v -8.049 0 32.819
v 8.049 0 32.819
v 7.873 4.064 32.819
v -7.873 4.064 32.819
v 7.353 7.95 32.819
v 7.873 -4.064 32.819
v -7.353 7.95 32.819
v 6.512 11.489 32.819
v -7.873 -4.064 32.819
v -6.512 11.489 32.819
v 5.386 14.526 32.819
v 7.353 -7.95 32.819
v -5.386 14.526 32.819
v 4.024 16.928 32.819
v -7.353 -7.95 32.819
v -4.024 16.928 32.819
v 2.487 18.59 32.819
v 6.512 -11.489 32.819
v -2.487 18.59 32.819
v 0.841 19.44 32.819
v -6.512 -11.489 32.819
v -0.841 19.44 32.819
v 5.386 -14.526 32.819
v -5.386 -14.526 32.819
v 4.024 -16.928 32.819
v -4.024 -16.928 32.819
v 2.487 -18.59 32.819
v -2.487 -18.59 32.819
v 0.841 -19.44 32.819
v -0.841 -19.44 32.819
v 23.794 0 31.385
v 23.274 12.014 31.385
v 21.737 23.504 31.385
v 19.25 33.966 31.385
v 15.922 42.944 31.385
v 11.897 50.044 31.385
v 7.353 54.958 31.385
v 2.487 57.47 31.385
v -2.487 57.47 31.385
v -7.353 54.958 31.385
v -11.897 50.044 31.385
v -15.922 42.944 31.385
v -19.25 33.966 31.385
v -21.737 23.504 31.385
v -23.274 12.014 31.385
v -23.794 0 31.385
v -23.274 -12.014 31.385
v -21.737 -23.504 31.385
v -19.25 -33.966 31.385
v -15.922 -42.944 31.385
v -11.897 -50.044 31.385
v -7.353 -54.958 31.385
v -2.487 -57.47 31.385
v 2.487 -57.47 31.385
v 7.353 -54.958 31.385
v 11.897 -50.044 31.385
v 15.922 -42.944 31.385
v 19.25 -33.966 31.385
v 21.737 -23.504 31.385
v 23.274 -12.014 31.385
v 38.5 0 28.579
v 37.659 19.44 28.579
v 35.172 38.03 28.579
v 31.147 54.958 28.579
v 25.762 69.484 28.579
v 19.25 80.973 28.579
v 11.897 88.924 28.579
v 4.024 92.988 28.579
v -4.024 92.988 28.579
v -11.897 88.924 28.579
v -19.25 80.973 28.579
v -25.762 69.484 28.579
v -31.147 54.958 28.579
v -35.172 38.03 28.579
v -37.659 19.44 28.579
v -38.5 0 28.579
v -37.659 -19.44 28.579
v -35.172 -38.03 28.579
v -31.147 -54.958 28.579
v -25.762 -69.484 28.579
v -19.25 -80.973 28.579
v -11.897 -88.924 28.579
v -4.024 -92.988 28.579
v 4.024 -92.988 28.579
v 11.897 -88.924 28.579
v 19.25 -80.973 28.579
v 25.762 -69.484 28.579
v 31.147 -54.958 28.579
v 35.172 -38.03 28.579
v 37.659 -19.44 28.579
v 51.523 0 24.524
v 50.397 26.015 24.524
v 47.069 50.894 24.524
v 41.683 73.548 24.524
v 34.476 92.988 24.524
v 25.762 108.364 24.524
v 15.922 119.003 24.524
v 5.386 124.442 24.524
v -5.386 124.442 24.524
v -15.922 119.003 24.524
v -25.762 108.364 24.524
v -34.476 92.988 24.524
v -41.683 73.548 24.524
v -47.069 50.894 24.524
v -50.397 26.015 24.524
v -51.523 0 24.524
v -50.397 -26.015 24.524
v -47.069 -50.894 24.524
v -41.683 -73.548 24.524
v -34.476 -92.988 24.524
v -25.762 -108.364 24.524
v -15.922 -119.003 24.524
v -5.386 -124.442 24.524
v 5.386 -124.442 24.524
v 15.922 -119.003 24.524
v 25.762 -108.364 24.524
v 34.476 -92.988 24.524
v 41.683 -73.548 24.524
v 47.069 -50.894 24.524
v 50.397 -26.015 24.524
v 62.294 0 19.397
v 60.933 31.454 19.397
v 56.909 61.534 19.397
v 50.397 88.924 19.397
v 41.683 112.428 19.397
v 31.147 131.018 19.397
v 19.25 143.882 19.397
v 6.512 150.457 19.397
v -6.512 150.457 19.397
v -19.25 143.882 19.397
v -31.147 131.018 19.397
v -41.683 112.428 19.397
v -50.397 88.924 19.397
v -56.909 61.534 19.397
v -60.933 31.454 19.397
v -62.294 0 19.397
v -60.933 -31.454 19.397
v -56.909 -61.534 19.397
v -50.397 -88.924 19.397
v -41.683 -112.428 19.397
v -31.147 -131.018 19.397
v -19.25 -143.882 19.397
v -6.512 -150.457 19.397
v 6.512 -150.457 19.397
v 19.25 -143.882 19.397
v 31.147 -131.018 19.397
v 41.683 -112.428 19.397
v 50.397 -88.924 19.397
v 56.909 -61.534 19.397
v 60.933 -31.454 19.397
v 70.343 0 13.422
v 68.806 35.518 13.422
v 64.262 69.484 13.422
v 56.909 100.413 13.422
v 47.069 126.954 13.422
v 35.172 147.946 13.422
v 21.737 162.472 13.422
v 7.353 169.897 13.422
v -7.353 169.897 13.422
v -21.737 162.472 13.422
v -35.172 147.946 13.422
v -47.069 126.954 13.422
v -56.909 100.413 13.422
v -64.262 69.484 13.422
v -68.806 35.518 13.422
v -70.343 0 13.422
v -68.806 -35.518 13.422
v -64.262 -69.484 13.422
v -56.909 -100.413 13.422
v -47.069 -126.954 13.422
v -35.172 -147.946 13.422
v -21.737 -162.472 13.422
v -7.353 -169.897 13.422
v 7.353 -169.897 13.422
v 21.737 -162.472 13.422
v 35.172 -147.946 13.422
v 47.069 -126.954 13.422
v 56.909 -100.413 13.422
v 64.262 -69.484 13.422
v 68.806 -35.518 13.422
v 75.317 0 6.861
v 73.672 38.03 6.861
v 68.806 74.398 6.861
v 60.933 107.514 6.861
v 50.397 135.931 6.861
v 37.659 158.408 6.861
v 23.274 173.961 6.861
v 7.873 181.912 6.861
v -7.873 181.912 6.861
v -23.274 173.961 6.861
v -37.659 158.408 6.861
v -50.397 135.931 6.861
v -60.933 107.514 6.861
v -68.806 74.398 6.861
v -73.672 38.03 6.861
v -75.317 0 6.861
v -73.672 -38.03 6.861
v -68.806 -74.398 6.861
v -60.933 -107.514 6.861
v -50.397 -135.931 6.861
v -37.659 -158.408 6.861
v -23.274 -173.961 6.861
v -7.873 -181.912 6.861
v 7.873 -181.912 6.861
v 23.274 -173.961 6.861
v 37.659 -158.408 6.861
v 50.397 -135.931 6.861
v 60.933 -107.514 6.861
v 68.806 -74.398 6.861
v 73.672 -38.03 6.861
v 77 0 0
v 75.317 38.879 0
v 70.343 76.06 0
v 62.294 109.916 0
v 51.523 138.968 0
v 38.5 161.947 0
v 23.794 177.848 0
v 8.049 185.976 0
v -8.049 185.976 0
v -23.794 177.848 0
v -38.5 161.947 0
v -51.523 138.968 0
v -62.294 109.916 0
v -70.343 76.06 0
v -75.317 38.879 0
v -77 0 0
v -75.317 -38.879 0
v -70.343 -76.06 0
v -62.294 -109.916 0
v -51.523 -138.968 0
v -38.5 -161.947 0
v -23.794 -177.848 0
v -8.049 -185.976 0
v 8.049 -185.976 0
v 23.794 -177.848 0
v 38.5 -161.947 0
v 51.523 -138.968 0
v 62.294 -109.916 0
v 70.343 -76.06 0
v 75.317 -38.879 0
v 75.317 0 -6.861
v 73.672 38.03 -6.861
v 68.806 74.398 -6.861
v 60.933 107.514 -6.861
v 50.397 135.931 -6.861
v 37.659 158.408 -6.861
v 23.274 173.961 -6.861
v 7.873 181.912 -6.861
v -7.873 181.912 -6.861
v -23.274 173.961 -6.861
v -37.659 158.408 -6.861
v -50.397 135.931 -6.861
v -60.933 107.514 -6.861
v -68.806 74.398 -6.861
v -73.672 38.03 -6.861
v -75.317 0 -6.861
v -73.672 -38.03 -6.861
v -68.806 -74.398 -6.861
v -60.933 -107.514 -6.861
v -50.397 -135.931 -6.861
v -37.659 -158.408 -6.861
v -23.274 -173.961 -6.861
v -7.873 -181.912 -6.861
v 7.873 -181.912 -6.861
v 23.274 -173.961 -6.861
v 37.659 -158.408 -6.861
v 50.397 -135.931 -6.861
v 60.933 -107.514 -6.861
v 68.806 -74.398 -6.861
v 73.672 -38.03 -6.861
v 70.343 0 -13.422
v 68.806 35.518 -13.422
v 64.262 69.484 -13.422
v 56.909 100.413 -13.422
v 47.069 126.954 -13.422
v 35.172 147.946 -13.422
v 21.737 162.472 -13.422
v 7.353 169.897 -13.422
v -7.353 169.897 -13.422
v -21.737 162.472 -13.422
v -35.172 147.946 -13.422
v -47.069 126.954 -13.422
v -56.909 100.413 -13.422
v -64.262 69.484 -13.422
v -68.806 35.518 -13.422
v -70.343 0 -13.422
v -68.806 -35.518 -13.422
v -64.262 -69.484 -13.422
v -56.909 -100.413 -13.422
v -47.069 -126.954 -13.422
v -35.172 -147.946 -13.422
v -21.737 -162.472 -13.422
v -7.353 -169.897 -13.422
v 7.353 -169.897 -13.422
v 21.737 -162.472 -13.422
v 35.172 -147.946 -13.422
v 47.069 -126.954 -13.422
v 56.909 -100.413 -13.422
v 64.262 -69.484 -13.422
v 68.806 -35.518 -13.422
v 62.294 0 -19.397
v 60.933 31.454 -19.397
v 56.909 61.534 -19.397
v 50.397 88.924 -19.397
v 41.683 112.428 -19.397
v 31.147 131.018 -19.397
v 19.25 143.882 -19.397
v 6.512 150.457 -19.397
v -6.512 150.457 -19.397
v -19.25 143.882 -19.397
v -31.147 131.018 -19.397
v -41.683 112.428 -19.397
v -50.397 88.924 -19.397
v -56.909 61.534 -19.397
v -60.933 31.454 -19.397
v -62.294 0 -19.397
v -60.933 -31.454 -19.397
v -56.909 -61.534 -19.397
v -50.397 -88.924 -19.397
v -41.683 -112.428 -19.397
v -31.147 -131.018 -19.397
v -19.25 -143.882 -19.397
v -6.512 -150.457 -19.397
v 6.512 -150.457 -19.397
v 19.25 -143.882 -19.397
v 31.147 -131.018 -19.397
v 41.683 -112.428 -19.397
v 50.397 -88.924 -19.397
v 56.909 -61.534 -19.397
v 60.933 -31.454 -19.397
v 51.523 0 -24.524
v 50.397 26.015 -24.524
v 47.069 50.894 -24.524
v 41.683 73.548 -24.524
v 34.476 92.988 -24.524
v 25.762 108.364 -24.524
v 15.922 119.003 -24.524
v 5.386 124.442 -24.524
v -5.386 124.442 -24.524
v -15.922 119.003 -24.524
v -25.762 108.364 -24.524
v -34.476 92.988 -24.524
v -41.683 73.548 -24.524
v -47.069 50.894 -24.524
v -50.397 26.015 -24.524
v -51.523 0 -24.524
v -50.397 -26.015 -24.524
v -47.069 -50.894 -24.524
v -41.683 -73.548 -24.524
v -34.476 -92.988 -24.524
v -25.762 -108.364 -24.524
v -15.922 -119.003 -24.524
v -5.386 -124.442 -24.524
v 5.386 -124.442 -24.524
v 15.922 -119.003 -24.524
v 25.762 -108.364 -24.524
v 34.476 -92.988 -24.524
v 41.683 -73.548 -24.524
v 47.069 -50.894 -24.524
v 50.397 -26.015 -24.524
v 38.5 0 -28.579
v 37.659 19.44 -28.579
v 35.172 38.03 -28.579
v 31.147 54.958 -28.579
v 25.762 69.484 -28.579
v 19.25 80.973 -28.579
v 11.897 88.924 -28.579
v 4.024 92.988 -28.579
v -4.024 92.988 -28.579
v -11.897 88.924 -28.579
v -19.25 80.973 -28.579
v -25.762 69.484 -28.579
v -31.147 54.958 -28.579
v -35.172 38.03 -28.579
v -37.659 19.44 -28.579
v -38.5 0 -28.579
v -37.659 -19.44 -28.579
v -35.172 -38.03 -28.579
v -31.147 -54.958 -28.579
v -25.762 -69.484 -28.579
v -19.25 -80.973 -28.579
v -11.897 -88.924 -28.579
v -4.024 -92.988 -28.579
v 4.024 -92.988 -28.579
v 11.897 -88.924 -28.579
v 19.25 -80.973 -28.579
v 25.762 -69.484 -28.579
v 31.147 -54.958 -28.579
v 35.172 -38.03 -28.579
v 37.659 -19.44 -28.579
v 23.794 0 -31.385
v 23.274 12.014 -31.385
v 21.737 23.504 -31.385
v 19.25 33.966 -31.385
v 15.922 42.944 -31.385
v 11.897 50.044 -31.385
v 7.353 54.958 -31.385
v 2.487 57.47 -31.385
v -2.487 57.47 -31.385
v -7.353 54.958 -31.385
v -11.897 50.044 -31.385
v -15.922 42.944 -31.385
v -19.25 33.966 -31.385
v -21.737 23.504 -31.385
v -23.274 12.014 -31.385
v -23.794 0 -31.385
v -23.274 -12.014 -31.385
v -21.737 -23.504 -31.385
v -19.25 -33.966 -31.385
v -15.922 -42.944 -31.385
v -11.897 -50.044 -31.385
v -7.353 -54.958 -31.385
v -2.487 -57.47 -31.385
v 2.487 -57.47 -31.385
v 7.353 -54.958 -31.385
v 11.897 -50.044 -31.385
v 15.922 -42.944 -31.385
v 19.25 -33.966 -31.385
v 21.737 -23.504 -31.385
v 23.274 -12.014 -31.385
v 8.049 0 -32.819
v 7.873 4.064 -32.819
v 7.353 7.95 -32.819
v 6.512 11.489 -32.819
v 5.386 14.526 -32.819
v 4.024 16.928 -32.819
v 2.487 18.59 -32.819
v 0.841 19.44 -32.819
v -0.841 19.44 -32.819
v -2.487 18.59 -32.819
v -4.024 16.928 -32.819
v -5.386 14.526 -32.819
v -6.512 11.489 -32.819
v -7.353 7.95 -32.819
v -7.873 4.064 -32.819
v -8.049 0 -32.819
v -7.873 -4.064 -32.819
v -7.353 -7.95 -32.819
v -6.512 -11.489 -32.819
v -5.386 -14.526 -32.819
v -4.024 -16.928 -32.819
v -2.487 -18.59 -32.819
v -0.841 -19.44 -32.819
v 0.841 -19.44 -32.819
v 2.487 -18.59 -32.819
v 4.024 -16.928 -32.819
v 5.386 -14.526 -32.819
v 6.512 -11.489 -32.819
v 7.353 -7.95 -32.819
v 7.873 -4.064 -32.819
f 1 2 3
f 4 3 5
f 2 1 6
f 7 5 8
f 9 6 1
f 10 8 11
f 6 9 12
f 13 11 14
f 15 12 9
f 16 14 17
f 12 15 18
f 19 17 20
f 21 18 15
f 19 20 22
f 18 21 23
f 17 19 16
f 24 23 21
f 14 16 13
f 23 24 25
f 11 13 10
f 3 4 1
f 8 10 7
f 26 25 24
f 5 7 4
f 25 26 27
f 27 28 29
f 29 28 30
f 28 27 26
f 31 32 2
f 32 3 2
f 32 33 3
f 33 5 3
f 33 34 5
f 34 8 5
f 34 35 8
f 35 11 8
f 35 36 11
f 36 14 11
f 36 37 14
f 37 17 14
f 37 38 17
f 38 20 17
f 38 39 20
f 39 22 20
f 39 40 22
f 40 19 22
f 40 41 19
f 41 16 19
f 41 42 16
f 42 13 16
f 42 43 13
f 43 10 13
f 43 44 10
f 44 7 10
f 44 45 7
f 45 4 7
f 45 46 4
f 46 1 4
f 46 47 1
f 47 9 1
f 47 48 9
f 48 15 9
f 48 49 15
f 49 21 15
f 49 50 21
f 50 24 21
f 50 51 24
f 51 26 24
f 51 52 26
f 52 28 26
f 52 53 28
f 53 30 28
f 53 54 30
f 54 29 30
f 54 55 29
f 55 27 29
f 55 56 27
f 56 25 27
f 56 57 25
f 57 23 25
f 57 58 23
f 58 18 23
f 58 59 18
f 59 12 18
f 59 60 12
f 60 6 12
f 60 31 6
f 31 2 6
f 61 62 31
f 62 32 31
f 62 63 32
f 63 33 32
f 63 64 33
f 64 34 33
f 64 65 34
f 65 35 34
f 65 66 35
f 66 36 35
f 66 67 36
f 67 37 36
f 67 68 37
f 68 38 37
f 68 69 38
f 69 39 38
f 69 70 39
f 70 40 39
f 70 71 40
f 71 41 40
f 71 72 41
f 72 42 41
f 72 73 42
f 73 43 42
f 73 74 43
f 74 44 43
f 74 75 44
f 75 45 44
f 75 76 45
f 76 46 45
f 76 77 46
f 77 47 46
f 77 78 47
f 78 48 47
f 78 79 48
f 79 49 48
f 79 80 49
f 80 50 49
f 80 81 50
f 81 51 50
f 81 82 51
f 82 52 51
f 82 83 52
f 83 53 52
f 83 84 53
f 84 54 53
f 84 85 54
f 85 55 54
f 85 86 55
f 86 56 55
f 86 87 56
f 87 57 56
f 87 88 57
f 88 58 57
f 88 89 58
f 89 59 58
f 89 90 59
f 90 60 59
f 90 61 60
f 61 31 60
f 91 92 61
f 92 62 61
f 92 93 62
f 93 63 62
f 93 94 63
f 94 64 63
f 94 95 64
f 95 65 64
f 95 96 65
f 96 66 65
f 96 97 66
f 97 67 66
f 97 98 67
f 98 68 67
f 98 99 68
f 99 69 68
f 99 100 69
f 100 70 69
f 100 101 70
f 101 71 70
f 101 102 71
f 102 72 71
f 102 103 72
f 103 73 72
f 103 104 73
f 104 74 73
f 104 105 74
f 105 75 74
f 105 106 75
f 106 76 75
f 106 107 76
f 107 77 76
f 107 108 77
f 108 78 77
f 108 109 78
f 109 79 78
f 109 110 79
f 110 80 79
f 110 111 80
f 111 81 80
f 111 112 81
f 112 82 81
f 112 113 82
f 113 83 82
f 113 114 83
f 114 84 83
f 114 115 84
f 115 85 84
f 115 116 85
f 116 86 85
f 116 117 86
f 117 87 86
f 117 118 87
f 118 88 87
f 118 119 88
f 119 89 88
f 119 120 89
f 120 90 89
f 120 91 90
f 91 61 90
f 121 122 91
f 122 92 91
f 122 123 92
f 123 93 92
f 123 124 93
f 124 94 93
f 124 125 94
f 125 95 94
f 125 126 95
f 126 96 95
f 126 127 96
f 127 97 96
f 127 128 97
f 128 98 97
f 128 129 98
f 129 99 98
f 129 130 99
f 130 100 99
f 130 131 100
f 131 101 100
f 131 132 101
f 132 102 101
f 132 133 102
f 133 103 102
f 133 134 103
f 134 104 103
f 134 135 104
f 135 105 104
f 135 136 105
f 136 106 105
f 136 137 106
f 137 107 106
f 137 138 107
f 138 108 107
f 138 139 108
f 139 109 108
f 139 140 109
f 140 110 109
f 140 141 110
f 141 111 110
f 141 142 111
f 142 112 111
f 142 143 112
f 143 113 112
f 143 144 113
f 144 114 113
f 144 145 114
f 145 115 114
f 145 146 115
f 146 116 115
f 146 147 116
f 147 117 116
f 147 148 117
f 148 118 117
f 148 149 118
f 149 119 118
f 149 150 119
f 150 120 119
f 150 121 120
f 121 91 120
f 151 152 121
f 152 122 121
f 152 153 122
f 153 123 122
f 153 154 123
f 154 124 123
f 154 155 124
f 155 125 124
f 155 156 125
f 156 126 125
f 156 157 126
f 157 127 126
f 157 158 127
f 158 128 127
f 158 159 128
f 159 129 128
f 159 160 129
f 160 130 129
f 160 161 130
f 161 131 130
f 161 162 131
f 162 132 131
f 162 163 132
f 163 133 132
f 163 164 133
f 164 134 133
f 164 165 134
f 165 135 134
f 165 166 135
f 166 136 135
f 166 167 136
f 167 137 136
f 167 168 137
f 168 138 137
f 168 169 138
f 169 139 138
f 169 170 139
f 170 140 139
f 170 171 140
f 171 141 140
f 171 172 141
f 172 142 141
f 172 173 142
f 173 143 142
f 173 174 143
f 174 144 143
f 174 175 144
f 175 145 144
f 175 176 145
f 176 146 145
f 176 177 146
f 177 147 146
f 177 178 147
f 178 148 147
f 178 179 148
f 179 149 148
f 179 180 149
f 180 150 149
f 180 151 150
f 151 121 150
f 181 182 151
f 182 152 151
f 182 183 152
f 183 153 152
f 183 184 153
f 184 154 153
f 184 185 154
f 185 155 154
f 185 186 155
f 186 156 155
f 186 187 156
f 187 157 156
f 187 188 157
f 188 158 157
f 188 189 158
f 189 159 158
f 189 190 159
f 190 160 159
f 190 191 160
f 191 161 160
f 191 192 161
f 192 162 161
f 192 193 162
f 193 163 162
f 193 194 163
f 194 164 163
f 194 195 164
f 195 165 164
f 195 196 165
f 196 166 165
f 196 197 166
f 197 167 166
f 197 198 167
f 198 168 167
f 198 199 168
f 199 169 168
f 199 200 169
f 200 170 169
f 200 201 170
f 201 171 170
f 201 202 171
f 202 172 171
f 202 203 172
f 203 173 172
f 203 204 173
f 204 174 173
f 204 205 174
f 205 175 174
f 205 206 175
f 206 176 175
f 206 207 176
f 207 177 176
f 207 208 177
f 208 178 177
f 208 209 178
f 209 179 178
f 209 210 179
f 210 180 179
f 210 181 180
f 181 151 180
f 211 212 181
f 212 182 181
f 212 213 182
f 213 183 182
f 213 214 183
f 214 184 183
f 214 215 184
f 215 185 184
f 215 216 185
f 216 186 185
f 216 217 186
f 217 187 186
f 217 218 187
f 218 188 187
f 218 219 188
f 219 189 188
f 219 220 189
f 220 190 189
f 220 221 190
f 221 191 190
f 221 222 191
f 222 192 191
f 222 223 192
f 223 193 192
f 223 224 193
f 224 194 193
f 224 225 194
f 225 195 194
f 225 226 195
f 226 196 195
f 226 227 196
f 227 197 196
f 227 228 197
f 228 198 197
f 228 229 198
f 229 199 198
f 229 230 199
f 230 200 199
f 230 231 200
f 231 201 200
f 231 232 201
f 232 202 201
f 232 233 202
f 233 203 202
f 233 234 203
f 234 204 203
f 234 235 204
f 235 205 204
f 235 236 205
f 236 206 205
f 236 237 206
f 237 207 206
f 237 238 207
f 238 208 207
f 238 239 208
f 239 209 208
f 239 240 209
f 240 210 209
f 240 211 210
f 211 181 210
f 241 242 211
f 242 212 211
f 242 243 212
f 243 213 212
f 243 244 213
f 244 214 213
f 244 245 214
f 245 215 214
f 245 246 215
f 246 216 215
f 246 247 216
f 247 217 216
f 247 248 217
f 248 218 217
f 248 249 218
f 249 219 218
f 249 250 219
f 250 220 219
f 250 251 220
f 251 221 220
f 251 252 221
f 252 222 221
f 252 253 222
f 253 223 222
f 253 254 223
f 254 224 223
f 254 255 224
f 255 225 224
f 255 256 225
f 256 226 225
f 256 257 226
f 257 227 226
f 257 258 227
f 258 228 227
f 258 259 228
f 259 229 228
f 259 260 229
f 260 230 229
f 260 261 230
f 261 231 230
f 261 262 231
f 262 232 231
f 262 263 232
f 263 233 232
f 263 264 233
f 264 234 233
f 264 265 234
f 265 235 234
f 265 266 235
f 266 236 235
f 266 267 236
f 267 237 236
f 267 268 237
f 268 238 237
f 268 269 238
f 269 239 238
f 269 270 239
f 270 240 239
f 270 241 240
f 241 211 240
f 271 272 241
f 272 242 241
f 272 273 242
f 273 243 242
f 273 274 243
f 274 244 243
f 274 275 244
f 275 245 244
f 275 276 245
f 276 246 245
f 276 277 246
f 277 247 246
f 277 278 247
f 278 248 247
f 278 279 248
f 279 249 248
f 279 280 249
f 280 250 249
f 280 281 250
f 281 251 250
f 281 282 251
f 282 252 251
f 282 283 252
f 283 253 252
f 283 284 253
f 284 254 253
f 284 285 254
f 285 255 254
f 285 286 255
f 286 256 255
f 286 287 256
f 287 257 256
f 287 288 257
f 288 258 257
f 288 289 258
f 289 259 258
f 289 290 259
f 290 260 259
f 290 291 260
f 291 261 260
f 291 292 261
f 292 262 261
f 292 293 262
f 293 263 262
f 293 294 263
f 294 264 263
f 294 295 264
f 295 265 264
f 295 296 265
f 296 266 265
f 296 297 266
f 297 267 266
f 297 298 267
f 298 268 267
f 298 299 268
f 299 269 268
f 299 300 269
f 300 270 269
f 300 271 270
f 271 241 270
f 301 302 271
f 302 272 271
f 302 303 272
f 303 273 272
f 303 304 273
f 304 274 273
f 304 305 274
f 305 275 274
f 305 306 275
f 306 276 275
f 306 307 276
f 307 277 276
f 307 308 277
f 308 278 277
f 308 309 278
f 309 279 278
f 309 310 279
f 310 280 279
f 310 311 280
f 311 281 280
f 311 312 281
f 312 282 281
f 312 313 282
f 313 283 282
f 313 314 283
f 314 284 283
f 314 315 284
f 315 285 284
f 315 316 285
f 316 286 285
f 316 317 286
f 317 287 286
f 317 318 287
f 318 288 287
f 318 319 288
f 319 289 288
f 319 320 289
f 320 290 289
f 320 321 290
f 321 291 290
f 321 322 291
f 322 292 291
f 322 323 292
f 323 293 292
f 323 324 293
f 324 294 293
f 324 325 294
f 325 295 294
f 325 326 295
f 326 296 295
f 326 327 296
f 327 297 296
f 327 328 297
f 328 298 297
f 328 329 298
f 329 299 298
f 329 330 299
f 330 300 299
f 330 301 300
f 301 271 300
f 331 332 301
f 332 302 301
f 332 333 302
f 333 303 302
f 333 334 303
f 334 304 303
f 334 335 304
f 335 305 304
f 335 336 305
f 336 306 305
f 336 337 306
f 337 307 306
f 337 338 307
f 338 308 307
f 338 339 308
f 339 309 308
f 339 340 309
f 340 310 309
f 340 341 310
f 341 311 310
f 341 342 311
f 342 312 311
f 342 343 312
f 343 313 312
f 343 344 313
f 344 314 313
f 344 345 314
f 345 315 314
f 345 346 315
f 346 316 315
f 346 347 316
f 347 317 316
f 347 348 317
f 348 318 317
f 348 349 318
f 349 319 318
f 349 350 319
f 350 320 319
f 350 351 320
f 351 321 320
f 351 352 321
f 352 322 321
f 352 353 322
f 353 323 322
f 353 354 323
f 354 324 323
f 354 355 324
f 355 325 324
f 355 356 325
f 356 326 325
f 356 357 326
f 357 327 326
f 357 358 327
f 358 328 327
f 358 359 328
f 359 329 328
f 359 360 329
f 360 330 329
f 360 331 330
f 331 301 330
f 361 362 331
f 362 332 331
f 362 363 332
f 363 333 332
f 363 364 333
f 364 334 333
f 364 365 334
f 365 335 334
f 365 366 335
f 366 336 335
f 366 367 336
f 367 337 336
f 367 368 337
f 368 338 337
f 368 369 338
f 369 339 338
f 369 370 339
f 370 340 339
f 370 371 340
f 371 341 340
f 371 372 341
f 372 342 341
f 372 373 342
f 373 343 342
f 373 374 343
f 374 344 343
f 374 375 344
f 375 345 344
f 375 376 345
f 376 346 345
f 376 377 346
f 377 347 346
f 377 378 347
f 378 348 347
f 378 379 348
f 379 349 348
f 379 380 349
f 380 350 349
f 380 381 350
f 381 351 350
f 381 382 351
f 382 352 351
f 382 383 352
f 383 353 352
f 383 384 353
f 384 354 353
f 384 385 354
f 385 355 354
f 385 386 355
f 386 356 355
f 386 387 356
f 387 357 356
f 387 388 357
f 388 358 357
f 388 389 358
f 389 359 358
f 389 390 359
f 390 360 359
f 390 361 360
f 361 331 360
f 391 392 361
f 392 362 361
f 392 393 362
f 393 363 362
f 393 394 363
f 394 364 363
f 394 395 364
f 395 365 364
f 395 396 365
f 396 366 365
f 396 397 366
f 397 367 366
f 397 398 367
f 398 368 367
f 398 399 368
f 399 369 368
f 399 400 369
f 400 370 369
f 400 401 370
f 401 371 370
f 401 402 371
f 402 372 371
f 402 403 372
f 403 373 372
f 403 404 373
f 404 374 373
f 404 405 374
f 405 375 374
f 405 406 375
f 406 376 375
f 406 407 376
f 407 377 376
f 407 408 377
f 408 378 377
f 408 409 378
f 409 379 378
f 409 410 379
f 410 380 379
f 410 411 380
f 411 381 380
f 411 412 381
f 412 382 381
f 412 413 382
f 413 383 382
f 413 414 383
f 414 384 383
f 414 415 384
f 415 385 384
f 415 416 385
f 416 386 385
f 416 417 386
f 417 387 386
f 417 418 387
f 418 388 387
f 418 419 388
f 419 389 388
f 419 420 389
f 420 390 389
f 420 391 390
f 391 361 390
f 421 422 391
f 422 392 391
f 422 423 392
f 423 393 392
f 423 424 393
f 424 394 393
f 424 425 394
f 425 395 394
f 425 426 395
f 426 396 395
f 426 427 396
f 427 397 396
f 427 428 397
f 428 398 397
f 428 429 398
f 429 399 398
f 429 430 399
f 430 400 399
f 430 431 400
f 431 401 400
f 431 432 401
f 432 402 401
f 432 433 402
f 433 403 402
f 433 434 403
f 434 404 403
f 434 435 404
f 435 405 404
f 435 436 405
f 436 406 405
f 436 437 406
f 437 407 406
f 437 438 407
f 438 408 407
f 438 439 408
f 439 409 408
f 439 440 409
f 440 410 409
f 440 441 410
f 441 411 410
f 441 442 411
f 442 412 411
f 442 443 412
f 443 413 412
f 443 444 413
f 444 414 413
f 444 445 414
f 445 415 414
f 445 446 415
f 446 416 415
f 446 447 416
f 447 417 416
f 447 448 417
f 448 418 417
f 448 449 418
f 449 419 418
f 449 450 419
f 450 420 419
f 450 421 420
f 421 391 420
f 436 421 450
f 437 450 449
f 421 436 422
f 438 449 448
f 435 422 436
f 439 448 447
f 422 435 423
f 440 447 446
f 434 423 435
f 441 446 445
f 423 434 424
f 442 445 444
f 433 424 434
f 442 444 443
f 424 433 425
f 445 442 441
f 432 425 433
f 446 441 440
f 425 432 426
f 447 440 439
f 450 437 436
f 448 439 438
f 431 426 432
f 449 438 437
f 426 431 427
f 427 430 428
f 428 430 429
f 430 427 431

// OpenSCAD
// Generated by SolidPython 1.0.1 on 2020-07-29 00:46:48


scale(v = [7, 17, 3]) {
	sphere(r = 11);
}
/***********************************************
*********      SolidPython code:      **********
************************************************
 
# import packages: SolidPython
from solid import *
from solid.utils import *
from itertools import chain, combinations, permutations


class Resize:

    def __init__(self, scad_file):
        self.scad_file = scad_file
        #self.scad_file = import_scad(scad_file)
        # cone/cylinder param:
        self.r1 = 0
        self.r2 = 0
        self.h = 0
        # rectangular prism param:
        self.w = 0
        self.l = 0
        # ellipse param:
        self.r = 0

    # import OpenScad code (file name corresponds to shape)


    # classify shape + parameters
    def assign(self, param1, param2, param3):
        if self.scad_file == 'cone.scad':
            self.r1 = param1
            self.r2 = param2
            self.h = param3
        elif self.scad_file == 'cylinder.scad':
            self.r1 = param1
            self.r2 = param2
            self.h = param3
        elif self.scad_file == 'rectangularPrism.scad':
            self.h = param1
            self.l = param2
            self.w = param3
        else:
            self.r = param1
            self.h = param2

    # resize parameters
    def iterate(self):
        x = range(3, 20, 2)
        i = 1
        if self.scad_file == 'cone.scad':
            tempList = list(permutations(x, 2))
            for temp in tempList:
                param1 = temp[0]
                param2 = temp[1]
                filepath = 'produced_scad_files/' + 'cone' + str(param1) + '_' + str(param2) + '_' + '.scad'
                scad_render_to_file(cylinder(h=param1, r1=param2, r2=0), filepath)

        elif self.scad_file == 'cylinder.scad':
            tempList = list(permutations(x, 3))
            for temp in tempList:
                param1 = temp[0]
                param2 = temp[1]
                filepath = 'produced_scad_files/' + 'cylinder' + str(param1) + '_' + str(param2) + '_' + '.scad'
                scad_render_to_file(cylinder(h=param1, r1=param2, r2=param2), filepath)

        elif self.scad_file == 'rectangularPrism.scad':
            tempList = list(permutations(x, 3))
            for temp in tempList:
                param1 = temp[0]
                param2 = temp[1]
                param3 = temp[2]
                filepath = 'produced_scad_files/' + 'rectangularPrism' + str(param1) + '_' + str(param2) + '_' + str(
                    param3) + '.scad'
                scad_render_to_file(cube(size=(param1, param2, param3)), filepath)

        elif self.scad_file == 'ellipse.scad':
            tempList = list(permutations(x, 4))
            for temp in tempList:
                param1 = temp[0]
                param2 = temp[1]
                param3 = temp[2]
                param4 = temp[3]
                filepath = 'produced_scad_files/' + 'ellipse' + str(param1) + '_' + str(param2) + '_' + str(param3) + '_' + str(param4) + '.scad'
                scad_render_to_file(scale([param1, param2, param3])(sphere(r=param4)), filepath)

    def render_to_scadfile(self):
        scad_render_to_file(scad, 'example.scad') 
 
************************************************/
